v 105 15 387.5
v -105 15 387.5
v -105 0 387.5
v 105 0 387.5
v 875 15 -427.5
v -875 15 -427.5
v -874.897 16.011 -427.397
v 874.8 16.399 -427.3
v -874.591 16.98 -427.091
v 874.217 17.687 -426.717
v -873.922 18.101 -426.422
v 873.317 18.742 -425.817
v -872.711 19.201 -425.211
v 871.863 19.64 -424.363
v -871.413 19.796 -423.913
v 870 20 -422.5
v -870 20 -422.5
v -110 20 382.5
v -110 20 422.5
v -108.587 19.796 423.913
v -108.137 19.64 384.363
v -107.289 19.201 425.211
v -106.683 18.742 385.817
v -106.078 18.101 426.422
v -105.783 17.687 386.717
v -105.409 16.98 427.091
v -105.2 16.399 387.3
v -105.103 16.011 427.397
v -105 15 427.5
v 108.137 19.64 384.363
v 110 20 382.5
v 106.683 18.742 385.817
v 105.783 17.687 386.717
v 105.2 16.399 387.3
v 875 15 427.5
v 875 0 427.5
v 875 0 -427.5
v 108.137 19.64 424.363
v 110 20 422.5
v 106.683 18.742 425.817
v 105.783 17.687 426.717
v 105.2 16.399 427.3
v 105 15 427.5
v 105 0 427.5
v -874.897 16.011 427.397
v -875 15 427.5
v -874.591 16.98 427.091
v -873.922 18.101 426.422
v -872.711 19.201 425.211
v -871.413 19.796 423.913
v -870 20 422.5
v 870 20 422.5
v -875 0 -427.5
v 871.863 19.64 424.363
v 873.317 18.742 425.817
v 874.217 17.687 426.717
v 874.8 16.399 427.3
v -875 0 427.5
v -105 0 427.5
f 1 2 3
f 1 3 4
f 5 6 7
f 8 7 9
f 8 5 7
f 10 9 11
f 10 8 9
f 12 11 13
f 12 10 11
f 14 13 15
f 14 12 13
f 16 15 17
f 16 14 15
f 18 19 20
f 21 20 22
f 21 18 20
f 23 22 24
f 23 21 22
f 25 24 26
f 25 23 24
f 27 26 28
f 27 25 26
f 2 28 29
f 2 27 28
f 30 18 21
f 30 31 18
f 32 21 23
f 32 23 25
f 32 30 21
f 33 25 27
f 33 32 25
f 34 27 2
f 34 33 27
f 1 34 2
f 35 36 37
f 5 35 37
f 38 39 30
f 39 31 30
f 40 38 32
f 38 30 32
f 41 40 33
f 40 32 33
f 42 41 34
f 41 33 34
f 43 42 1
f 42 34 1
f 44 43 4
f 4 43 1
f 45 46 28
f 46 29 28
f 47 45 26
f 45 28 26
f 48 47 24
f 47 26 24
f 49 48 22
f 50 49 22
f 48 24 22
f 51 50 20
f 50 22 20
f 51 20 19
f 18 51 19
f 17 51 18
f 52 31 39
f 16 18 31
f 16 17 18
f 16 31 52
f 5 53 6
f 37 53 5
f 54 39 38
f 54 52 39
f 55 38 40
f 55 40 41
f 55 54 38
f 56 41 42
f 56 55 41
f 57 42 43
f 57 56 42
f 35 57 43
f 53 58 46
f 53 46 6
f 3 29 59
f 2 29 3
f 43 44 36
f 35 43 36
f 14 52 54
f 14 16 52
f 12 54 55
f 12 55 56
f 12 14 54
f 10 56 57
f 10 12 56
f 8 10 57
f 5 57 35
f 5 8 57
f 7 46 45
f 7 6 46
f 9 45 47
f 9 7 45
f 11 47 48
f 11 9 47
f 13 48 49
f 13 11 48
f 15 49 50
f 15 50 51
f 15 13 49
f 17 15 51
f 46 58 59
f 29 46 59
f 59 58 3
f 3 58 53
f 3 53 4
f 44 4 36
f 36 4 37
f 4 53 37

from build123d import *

# Parameters (mm, degrees)
SKETCH1_W           = 1750
SKETCH1_H           = 855
BOSS_EXTRUDE1_DEPTH = 20
SKETCH2_W           = 210
SKETCH2_H           = 80
CUT_EXTRUDE1_DEPTH  = 20
FILLET1_R           = 5


with BuildPart() as part:
    # Sketch1 → Boss-Extrude1 (new body)
    with BuildSketch(Plane(origin=(0, 0, 0), x_dir=(1, 0, 0), z_dir=(0, 1, 0))):
        Rectangle(SKETCH1_W, SKETCH1_H)
    extrude(amount=BOSS_EXTRUDE1_DEPTH)

    # Sketch2 → Cut-Extrude1 (cut)
    with BuildSketch(Plane(origin=(0, 20, 0), x_dir=(1, 0, 0), z_dir=(0, 1, 0))):
        with Locations((0, -427.5)):
            Rectangle(SKETCH2_W, SKETCH2_H)
    extrude(amount=-CUT_EXTRUDE1_DEPTH, mode=Mode.SUBTRACT)

    # Fillet1
    fillet1_edges = [part.edges().sort_by_distance(p)[0] for p in [
        (-875, 20, 0),
        (490, 20, 427.5),
        (-490, 20, 427.5),
        (-105, 20, 407.5),
        (105, 20, 407.5),
        (0, 20, 387.5),
        (875, 20, 0),
        (0, 20, -427.5),
    ]]
    fillet(fillet1_edges, radius=FILLET1_R)


solid = part.part
